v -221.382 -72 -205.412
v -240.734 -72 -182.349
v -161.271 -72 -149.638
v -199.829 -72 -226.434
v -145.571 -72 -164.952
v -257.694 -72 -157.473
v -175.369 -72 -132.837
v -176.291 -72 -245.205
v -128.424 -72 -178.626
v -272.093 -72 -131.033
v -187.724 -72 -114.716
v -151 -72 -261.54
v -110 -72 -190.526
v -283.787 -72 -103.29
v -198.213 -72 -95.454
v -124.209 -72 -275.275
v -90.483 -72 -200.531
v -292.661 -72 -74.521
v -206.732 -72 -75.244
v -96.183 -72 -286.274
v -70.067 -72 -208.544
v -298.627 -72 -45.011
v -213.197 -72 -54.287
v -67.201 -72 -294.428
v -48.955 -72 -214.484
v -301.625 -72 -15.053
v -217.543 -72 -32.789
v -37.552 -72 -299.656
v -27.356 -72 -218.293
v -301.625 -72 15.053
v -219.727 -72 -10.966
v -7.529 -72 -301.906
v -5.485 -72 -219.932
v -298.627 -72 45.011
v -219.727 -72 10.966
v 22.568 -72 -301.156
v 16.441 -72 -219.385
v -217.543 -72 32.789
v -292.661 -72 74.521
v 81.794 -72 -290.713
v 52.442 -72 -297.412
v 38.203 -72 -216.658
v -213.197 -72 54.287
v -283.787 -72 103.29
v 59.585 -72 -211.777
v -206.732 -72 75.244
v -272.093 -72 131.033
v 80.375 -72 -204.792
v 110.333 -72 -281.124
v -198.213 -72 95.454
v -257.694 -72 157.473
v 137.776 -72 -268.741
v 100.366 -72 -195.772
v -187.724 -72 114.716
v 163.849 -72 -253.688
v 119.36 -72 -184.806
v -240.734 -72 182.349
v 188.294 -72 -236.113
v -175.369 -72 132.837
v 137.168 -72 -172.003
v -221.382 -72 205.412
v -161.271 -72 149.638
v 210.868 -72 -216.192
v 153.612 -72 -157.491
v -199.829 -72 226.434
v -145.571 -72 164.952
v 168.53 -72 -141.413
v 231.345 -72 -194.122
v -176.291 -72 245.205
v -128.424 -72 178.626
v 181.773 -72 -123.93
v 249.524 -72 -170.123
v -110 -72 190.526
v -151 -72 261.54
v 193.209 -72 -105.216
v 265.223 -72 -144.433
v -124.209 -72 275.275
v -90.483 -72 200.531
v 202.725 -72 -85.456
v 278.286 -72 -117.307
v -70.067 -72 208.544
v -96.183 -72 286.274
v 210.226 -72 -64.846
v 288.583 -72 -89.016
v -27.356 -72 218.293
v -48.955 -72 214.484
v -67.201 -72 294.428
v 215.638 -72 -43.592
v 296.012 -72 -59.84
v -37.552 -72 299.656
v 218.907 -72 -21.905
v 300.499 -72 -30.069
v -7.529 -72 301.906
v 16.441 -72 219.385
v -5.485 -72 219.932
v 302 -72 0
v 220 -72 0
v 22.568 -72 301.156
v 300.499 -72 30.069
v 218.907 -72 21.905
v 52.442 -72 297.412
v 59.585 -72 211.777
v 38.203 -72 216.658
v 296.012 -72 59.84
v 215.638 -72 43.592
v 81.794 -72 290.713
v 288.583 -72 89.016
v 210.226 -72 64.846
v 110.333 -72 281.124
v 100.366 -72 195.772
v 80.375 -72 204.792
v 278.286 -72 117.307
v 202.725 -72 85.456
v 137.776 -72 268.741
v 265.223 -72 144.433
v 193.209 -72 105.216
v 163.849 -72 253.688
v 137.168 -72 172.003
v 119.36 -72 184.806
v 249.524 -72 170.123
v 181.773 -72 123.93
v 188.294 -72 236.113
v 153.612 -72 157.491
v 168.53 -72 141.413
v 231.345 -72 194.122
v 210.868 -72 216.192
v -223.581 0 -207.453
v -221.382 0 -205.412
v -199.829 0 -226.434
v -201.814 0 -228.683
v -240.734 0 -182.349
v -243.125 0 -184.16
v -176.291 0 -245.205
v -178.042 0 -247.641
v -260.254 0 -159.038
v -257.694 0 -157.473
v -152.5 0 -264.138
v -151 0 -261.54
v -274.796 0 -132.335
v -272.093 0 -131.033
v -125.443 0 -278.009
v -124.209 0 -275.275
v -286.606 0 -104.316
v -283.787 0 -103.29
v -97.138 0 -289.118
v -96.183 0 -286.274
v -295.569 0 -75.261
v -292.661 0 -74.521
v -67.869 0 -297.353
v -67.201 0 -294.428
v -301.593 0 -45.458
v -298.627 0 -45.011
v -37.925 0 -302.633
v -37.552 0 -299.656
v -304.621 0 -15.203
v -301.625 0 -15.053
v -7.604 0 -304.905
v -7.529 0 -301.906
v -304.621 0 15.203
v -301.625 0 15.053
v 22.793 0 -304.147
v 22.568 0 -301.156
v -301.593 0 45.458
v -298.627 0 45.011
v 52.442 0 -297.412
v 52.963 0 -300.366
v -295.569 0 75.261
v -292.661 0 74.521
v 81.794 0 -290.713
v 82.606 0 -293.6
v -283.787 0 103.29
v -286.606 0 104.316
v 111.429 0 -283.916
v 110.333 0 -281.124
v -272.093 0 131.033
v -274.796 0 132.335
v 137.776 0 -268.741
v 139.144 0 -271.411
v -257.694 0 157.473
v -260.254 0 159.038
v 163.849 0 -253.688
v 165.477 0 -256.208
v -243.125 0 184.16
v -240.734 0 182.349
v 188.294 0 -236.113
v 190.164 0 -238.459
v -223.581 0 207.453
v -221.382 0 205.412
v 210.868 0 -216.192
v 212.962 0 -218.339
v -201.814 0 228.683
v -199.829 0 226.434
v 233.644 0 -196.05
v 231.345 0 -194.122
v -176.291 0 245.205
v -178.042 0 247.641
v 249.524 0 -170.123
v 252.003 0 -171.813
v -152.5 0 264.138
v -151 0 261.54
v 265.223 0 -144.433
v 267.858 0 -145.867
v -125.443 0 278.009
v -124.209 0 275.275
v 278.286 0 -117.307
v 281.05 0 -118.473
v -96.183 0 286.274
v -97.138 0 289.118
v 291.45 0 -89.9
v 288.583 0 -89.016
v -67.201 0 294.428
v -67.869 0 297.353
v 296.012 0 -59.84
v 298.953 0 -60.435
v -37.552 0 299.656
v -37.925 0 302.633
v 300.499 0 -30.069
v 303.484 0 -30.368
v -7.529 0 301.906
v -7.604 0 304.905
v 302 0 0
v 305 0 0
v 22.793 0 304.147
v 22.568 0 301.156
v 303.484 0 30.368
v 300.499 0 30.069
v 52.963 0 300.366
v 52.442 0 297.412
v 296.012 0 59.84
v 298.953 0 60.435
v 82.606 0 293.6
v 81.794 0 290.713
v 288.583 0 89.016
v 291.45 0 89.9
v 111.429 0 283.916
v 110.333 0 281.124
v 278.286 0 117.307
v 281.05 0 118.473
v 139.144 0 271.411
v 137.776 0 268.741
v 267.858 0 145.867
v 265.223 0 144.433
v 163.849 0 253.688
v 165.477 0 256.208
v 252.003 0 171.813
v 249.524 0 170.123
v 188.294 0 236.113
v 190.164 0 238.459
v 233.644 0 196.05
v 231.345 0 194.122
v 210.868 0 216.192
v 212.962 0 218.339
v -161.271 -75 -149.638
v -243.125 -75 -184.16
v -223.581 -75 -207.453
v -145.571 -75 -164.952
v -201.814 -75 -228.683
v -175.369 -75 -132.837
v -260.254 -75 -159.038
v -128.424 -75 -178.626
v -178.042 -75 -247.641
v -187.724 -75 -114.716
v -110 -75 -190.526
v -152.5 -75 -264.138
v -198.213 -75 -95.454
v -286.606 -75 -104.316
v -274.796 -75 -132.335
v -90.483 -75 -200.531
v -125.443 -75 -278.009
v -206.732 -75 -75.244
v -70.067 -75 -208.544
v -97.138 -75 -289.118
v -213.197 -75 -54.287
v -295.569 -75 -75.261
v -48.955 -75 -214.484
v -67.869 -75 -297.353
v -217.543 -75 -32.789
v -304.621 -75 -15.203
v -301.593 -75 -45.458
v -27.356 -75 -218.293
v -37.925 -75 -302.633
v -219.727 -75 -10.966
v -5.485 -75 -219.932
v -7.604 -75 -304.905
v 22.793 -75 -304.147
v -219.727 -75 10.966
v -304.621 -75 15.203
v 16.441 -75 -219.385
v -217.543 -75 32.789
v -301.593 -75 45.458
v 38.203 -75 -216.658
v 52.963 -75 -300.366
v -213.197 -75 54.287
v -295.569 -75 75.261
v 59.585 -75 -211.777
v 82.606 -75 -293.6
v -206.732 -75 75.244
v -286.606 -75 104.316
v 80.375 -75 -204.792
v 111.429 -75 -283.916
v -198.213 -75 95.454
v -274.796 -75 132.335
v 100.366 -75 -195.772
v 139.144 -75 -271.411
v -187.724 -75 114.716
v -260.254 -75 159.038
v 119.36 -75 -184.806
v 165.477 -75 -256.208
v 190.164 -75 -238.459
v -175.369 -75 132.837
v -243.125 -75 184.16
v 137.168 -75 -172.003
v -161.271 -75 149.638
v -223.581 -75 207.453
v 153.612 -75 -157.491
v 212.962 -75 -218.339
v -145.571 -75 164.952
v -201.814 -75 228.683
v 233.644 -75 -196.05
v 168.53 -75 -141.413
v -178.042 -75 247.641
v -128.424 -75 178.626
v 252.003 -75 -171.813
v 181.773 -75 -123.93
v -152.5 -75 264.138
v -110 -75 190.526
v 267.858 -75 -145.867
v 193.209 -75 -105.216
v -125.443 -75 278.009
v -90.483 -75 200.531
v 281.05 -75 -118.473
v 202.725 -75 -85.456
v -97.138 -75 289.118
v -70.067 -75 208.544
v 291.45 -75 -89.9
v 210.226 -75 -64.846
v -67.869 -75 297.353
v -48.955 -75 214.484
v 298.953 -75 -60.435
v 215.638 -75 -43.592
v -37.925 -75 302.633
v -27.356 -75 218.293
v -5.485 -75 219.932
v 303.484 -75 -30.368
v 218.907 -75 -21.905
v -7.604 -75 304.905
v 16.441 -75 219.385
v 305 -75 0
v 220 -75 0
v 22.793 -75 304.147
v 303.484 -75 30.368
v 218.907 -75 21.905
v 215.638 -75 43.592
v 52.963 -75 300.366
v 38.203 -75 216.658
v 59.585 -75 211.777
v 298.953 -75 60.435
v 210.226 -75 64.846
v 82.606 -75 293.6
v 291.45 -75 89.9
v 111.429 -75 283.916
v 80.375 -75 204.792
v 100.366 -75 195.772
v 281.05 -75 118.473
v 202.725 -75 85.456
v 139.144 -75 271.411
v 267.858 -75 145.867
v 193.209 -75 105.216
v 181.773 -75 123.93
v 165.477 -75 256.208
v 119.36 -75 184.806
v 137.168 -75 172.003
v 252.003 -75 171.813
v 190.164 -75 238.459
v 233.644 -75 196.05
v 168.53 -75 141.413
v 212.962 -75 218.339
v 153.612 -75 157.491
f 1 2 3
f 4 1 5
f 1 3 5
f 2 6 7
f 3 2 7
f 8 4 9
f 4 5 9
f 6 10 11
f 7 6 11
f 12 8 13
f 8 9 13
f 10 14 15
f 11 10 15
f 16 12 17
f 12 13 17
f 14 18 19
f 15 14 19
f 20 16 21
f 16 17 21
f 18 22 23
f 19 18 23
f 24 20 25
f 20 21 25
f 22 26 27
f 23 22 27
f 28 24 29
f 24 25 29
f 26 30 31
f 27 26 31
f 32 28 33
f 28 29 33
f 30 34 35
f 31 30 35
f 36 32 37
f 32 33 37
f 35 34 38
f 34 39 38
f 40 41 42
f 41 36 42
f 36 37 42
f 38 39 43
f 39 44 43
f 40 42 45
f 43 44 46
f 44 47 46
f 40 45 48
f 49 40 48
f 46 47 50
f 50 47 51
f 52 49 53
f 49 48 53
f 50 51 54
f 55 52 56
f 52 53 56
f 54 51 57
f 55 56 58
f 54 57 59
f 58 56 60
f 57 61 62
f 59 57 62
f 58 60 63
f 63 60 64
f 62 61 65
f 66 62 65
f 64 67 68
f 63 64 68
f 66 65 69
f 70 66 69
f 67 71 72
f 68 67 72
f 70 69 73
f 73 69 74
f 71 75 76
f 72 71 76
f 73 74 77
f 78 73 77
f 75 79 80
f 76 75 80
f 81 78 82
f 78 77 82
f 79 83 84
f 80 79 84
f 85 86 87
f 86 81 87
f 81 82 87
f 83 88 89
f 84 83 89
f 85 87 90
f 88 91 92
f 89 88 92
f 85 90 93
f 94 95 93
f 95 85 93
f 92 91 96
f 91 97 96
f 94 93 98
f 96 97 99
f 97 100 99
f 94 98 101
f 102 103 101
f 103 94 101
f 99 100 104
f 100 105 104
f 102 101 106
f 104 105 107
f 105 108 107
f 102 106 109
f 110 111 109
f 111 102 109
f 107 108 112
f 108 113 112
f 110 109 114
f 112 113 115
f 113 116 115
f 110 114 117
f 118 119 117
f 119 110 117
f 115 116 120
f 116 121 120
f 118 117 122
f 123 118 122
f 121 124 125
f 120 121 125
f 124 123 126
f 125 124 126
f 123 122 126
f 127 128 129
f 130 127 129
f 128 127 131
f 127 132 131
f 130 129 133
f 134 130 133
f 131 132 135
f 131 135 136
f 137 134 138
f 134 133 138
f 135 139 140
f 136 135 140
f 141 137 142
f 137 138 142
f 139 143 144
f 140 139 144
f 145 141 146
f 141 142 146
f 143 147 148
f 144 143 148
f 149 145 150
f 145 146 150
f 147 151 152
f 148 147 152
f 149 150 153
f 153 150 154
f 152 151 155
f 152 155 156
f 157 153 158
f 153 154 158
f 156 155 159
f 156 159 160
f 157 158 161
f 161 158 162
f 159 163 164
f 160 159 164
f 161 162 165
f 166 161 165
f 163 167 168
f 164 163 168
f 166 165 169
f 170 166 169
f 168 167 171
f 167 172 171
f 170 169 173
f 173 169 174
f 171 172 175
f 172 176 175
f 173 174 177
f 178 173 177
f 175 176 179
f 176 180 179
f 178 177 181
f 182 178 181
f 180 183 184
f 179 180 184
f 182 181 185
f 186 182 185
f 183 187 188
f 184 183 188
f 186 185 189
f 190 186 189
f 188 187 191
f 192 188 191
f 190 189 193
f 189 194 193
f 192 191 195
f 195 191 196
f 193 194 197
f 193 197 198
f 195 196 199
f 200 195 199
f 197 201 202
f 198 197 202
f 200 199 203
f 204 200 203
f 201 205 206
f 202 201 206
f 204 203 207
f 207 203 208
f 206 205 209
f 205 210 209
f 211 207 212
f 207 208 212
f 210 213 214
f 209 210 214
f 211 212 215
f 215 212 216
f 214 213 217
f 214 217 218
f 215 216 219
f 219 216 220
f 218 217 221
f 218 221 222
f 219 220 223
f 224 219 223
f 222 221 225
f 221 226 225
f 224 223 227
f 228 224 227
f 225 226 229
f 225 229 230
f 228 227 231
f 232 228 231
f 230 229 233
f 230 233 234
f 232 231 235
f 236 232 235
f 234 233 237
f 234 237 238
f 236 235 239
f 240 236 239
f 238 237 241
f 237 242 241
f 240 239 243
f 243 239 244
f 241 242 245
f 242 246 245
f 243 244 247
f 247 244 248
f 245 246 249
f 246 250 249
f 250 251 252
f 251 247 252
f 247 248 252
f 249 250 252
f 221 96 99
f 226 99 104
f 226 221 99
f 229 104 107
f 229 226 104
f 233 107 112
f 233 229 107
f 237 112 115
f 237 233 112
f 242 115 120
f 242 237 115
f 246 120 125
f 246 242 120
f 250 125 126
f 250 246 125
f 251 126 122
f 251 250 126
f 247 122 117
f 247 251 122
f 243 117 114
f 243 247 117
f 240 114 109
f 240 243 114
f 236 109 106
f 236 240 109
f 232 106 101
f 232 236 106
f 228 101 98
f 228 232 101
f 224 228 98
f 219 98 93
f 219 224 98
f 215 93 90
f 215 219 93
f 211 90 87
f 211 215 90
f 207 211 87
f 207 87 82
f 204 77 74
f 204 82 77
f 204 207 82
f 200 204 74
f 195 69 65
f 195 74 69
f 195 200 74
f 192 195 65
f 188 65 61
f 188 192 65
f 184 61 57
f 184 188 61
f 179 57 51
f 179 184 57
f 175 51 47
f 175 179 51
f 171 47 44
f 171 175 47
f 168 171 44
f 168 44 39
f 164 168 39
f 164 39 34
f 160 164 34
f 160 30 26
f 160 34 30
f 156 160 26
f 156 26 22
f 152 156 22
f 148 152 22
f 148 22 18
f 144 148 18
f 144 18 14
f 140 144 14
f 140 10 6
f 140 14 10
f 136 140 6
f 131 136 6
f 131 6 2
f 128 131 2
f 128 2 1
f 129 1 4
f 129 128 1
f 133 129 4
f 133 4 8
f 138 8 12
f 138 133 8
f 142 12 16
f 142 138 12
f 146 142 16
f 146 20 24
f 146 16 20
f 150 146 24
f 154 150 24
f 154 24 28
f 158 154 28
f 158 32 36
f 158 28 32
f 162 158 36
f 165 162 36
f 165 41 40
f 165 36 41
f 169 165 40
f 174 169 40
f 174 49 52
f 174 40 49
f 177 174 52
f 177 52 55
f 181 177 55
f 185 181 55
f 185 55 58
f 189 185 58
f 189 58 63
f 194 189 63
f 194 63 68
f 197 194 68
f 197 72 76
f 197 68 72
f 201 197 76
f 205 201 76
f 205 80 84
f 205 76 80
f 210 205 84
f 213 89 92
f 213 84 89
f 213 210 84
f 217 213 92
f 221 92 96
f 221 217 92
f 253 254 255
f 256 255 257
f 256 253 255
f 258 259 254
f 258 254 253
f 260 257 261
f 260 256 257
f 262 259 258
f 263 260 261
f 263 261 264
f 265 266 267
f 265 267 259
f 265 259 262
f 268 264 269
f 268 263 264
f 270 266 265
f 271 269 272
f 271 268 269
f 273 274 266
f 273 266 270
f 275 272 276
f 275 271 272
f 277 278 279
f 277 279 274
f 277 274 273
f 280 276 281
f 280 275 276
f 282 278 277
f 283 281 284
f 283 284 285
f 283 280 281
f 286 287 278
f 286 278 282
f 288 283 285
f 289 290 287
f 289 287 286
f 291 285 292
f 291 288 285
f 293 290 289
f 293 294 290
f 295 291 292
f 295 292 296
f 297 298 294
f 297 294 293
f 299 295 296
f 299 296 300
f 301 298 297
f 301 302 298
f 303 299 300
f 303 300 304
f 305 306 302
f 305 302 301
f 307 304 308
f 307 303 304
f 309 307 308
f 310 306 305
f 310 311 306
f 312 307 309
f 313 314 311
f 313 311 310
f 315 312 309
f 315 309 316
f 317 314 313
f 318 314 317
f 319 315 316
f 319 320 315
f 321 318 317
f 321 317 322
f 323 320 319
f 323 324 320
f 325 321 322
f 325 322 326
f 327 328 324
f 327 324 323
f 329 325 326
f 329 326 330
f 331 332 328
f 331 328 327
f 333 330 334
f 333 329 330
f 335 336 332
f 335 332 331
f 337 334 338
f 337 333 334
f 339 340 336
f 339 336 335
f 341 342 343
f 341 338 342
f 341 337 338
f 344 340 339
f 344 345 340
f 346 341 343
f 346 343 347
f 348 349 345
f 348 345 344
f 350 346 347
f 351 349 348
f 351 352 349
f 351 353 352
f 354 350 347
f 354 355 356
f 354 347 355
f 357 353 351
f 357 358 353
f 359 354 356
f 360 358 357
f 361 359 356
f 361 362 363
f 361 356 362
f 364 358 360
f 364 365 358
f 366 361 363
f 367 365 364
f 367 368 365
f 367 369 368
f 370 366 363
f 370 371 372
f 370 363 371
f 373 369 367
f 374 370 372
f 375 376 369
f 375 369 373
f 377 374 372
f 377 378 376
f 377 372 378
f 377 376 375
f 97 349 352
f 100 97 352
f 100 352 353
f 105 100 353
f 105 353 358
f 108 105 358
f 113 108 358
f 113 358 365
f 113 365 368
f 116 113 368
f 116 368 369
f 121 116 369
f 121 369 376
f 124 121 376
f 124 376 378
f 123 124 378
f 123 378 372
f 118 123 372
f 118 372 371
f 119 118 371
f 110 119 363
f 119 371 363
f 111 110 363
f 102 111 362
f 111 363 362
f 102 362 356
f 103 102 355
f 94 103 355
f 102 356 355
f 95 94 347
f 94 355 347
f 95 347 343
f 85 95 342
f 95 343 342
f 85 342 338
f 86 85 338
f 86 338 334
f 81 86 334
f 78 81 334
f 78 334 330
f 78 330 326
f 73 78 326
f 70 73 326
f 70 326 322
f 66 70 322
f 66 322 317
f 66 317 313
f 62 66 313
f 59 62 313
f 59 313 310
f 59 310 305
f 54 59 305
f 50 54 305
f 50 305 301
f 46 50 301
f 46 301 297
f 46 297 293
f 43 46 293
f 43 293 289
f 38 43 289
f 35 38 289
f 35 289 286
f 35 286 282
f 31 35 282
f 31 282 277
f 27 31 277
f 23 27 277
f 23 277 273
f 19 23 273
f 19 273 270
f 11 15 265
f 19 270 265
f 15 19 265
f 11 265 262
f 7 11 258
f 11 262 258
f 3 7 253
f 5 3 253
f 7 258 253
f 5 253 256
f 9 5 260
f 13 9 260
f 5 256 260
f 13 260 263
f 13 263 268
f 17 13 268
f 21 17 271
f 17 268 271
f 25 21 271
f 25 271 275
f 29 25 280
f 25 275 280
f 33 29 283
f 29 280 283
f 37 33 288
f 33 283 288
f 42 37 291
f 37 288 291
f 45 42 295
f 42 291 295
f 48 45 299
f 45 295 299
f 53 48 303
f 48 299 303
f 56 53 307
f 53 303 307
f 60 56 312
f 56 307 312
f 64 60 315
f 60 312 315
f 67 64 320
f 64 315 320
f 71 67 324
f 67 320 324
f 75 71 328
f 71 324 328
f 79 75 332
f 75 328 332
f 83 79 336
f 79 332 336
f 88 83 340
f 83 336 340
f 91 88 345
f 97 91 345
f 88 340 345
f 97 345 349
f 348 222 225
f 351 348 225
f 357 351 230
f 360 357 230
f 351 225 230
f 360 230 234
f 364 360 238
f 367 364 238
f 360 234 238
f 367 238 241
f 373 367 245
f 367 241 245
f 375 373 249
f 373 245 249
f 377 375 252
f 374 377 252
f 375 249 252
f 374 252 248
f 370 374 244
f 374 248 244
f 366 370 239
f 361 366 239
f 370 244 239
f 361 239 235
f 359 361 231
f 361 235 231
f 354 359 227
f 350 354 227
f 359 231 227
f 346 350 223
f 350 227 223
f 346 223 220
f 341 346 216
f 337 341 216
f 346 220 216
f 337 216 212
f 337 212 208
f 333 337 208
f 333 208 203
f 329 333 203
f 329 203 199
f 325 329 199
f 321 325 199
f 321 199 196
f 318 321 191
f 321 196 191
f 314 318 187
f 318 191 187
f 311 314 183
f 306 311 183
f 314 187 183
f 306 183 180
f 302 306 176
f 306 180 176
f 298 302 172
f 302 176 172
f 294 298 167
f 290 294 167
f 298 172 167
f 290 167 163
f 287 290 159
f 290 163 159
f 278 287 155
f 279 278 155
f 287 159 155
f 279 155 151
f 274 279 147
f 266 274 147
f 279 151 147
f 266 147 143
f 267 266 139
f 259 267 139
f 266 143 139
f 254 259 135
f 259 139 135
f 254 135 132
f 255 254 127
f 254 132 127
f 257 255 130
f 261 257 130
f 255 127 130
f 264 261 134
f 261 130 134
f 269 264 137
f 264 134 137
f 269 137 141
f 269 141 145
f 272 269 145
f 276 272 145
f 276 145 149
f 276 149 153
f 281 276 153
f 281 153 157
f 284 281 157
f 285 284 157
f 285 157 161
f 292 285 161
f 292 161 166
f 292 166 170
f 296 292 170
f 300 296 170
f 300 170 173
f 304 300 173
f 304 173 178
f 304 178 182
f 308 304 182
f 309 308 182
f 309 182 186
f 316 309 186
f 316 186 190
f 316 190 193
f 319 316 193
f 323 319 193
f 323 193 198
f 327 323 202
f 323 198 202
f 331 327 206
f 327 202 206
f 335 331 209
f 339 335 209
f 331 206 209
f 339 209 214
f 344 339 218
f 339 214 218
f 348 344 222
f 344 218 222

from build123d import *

# Parameters (mm, degrees)
F0_R     = 305
F1_DEPTH = 75
F2_T     = -3
F3_R     = 220
F4_DEPTH = 75.001


with BuildPart() as f1:
    # F0 (on Front) → F1 (new body)
    with BuildSketch(Plane.XZ):
        Circle(F0_R)
    extrude(amount=F1_DEPTH)

    # F2
    f2_openings = [f1.faces().sort_by_distance(p)[0] for p in [
        (0, 0, 0),
    ]]
    offset(amount=F2_T, openings=f2_openings)

    # F3 (on face) → F4 (cut, through all)
    with BuildSketch(Plane.XZ.offset(75)):
        Circle(F3_R)
    extrude(amount=-F4_DEPTH, mode=Mode.SUBTRACT)


solid = f1.part
